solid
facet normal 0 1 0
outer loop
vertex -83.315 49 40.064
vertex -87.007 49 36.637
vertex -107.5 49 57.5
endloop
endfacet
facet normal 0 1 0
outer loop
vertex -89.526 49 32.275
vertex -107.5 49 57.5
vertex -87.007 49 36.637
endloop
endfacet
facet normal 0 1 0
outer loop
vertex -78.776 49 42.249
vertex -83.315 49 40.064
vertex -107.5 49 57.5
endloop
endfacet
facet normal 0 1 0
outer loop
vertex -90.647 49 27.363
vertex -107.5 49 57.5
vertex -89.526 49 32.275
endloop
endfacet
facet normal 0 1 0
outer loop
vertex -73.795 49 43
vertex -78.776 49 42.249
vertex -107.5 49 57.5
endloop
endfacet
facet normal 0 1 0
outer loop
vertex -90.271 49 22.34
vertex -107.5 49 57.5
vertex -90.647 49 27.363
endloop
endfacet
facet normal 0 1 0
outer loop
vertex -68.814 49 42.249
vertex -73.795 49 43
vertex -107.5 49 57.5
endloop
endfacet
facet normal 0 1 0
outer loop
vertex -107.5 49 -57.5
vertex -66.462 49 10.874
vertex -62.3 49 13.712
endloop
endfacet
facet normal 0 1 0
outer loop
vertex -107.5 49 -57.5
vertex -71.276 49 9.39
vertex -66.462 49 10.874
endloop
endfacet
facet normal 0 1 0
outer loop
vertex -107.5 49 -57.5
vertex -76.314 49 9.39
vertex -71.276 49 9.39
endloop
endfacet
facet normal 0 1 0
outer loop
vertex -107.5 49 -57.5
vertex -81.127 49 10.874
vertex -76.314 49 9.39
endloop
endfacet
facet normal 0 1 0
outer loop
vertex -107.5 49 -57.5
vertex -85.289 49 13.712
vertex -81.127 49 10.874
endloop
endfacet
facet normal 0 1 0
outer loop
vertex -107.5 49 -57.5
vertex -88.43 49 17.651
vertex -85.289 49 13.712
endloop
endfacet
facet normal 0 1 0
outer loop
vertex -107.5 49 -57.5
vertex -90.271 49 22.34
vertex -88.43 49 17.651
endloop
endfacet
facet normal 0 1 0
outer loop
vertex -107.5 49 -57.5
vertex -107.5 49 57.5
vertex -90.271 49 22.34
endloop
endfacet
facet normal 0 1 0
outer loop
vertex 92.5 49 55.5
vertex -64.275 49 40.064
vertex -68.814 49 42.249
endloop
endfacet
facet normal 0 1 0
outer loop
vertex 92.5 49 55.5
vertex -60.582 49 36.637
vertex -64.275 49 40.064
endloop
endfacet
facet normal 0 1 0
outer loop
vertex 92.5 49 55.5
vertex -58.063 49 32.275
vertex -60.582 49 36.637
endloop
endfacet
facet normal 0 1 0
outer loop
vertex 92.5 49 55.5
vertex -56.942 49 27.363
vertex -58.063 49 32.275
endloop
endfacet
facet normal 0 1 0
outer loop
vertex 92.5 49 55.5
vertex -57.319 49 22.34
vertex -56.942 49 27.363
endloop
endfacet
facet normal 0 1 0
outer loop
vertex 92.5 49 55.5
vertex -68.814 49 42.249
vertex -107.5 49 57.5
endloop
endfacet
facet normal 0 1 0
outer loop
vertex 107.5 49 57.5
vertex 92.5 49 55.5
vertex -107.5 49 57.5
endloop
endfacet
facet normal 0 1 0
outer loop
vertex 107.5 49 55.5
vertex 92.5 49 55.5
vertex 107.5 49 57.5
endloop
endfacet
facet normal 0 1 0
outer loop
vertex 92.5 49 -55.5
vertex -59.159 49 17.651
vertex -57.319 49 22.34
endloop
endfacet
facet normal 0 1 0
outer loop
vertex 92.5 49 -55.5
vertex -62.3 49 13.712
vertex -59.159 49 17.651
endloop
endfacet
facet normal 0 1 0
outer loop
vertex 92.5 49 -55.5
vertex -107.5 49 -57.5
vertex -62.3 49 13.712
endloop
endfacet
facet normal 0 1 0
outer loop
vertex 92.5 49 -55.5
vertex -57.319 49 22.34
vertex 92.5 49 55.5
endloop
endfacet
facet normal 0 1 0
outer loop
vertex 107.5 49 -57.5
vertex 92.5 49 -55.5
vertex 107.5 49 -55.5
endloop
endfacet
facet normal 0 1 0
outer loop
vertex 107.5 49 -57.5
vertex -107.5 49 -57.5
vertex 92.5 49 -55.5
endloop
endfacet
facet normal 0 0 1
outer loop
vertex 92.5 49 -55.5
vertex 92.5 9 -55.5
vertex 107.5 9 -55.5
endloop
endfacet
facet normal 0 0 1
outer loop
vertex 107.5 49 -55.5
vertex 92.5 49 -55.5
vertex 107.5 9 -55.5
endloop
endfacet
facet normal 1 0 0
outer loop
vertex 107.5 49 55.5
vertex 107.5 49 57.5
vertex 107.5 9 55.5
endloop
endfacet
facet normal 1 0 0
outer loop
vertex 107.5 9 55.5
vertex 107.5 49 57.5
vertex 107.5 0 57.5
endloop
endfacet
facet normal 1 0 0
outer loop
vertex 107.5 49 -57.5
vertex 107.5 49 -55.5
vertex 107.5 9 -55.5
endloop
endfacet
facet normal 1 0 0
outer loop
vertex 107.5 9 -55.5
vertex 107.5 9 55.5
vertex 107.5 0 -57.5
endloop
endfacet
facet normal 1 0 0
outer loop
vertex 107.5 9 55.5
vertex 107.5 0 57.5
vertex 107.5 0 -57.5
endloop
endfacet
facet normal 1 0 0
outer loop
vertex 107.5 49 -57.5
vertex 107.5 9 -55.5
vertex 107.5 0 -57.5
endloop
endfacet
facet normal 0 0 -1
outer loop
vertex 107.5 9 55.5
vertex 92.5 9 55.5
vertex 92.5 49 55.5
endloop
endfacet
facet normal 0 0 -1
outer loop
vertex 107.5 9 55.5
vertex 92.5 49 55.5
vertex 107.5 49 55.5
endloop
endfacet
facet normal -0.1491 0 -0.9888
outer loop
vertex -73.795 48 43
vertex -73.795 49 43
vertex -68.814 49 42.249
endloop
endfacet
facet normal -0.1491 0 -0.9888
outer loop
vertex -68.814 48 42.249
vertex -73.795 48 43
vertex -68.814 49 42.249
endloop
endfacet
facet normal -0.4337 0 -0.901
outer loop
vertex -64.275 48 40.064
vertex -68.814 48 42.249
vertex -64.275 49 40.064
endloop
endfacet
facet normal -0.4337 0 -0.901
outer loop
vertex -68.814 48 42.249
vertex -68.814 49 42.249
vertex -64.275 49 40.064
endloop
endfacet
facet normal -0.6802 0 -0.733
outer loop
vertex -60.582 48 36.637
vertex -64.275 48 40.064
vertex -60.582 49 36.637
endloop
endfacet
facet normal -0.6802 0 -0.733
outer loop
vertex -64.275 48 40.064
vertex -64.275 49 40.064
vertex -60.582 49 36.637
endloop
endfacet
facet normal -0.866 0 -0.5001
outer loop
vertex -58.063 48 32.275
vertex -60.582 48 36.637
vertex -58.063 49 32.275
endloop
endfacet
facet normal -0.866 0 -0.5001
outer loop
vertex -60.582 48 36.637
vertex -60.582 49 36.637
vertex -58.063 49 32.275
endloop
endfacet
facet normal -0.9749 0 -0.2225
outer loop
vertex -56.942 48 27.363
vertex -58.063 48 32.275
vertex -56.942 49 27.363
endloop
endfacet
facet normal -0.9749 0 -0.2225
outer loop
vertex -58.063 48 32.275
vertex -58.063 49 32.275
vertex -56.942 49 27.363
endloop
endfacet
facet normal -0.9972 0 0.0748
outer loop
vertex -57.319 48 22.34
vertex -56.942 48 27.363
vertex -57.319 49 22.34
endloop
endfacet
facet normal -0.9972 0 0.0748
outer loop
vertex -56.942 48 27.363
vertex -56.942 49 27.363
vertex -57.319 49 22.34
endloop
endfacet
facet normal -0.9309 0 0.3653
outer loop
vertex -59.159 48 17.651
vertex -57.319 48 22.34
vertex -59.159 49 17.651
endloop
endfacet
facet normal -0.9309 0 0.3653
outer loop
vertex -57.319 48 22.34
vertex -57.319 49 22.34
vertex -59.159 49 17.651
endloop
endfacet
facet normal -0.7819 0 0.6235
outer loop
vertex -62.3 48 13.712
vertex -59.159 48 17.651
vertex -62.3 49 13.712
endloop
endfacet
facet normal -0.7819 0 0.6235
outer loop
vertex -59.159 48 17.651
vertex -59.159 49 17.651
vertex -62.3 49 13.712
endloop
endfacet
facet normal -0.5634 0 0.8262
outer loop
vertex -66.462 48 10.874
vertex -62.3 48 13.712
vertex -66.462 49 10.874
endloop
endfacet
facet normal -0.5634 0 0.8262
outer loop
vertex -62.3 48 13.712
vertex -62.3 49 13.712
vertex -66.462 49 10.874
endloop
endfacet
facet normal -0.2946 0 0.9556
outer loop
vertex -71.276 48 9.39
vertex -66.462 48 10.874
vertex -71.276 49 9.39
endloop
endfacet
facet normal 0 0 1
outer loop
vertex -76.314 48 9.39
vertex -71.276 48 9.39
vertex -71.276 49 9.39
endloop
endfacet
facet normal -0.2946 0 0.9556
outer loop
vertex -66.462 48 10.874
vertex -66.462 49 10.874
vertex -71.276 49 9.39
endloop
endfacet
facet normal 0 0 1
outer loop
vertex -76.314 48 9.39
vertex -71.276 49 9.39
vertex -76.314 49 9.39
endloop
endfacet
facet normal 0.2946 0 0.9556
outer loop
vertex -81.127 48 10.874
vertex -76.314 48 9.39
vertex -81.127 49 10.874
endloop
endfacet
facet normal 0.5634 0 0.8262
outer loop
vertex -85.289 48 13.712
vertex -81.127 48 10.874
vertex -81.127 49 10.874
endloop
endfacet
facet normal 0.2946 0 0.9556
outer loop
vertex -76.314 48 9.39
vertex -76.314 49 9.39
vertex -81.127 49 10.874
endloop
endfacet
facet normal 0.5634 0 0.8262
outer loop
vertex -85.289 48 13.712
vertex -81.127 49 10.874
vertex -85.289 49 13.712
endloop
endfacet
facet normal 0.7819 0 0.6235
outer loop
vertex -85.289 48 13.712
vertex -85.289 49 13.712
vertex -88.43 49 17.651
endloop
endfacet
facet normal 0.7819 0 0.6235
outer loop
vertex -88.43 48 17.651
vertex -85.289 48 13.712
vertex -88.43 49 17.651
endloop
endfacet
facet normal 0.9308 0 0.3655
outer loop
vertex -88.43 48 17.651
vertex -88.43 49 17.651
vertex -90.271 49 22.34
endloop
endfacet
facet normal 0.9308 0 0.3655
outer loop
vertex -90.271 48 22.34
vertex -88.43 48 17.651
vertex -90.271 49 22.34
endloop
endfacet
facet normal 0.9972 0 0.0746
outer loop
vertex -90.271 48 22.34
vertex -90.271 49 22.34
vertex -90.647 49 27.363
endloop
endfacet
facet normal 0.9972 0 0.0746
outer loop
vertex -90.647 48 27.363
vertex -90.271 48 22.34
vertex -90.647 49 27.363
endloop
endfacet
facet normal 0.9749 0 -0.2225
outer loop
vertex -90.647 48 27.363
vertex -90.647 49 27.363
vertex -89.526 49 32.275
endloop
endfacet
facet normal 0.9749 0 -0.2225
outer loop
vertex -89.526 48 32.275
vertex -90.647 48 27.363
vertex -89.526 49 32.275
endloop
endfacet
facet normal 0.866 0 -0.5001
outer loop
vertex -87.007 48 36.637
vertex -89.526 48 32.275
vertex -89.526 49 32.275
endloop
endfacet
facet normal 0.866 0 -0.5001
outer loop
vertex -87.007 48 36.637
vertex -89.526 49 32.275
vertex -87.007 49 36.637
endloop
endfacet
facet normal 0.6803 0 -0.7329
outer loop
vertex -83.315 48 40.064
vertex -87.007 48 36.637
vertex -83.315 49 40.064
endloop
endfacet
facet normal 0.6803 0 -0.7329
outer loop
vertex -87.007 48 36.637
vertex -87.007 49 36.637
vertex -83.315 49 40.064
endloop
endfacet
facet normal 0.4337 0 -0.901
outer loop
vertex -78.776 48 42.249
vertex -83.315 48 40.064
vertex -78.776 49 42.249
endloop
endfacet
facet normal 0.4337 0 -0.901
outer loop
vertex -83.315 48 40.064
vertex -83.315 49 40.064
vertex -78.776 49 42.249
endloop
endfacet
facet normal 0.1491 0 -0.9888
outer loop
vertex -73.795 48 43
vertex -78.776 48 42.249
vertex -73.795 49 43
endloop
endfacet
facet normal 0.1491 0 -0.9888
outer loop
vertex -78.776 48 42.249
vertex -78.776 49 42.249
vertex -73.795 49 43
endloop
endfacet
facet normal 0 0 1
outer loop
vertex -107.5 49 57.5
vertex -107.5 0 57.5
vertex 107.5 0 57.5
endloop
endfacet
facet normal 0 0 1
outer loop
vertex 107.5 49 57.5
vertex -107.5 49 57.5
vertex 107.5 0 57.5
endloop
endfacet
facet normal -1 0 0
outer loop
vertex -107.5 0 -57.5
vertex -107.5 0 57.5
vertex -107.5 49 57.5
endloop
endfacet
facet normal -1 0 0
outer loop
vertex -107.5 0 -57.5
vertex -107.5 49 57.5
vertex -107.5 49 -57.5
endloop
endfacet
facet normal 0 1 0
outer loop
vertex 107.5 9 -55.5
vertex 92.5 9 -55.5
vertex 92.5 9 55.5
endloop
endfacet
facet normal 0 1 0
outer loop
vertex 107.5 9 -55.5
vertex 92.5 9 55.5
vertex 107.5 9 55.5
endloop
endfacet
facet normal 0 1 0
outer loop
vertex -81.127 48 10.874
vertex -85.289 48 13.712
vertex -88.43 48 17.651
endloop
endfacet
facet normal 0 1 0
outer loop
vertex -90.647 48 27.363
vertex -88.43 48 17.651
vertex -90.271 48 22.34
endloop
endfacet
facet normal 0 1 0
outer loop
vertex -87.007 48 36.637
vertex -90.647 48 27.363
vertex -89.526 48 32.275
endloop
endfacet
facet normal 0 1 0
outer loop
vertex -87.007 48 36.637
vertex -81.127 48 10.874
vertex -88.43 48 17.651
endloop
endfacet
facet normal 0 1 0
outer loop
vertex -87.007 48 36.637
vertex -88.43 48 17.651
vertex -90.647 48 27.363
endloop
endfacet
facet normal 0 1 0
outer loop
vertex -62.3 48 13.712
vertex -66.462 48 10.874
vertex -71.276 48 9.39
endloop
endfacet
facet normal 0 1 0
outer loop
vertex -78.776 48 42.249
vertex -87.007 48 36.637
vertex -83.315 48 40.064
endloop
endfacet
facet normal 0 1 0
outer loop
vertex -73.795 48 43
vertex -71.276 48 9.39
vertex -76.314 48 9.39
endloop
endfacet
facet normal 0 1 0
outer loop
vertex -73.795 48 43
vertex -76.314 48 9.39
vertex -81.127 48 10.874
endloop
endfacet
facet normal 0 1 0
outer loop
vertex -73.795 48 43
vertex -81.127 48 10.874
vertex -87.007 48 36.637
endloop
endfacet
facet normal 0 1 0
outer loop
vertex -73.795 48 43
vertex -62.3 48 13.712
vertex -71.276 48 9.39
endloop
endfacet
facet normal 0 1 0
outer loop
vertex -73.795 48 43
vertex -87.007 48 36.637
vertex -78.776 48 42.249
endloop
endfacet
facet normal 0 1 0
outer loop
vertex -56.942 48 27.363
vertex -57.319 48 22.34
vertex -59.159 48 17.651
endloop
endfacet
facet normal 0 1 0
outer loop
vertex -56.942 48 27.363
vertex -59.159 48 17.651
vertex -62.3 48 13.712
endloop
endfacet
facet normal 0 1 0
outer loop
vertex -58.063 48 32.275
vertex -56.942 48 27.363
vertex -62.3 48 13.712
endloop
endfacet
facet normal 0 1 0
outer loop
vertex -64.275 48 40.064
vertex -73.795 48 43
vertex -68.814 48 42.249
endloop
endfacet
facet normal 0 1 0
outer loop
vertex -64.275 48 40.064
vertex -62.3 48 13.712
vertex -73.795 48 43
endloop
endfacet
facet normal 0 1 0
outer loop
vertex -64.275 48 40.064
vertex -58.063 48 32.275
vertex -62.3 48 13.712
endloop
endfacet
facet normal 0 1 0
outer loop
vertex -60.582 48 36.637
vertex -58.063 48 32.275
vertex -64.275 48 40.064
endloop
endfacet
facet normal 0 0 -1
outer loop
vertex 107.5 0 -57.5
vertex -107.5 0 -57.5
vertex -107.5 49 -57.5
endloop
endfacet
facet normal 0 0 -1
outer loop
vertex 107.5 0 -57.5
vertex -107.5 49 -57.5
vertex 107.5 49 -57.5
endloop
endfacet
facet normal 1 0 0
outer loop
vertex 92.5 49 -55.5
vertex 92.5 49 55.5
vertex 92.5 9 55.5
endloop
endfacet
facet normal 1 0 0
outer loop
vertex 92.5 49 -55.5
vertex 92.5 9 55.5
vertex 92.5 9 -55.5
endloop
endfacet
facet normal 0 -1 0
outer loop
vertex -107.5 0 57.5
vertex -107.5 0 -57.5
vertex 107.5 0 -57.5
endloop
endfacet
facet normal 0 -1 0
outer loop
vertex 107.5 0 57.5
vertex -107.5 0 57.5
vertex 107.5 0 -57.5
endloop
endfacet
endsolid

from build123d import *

# Parameters (mm, degrees)
SKETCH1_W           = 215
SKETCH1_H           = 115
BOSS_EXTRUDE1_DEPTH = 49
SKETCH2_R           = 16.899563319
CUT_EXTRUDE1_DEPTH  = 1
SKETCH4_W           = 15
SKETCH4_H           = 111
CUT_EXTRUDE2_DEPTH  = 40


with BuildPart() as part:
    # Sketch1 → Boss-Extrude1 (new body)
    with BuildSketch(Plane(origin=(0, 0, 0), x_dir=(1, 0, 0), z_dir=(0, 1, 0))):
        Rectangle(SKETCH1_W, SKETCH1_H)
    extrude(amount=BOSS_EXTRUDE1_DEPTH)

    # Sketch2 → Cut-Extrude1 (cut)
    with BuildSketch(Plane(origin=(0, 49, 0), x_dir=(1, 0, 0), z_dir=(0, 1, 0))):
        with Locations(Location((-73.794759825, -26.100436681, 0), (0, 0, 270))):
            Circle(SKETCH2_R)
    extrude(amount=-CUT_EXTRUDE1_DEPTH, mode=Mode.SUBTRACT)

    # Sketch4 → Cut-Extrude2 (cut)
    with BuildSketch(Plane(origin=(0, 49, 0), x_dir=(1, 0, 0), z_dir=(0, 1, 0))):
        with Locations((100, 0)):
            Rectangle(SKETCH4_W, SKETCH4_H)
    extrude(amount=-CUT_EXTRUDE2_DEPTH, mode=Mode.SUBTRACT)


solid = part.part
